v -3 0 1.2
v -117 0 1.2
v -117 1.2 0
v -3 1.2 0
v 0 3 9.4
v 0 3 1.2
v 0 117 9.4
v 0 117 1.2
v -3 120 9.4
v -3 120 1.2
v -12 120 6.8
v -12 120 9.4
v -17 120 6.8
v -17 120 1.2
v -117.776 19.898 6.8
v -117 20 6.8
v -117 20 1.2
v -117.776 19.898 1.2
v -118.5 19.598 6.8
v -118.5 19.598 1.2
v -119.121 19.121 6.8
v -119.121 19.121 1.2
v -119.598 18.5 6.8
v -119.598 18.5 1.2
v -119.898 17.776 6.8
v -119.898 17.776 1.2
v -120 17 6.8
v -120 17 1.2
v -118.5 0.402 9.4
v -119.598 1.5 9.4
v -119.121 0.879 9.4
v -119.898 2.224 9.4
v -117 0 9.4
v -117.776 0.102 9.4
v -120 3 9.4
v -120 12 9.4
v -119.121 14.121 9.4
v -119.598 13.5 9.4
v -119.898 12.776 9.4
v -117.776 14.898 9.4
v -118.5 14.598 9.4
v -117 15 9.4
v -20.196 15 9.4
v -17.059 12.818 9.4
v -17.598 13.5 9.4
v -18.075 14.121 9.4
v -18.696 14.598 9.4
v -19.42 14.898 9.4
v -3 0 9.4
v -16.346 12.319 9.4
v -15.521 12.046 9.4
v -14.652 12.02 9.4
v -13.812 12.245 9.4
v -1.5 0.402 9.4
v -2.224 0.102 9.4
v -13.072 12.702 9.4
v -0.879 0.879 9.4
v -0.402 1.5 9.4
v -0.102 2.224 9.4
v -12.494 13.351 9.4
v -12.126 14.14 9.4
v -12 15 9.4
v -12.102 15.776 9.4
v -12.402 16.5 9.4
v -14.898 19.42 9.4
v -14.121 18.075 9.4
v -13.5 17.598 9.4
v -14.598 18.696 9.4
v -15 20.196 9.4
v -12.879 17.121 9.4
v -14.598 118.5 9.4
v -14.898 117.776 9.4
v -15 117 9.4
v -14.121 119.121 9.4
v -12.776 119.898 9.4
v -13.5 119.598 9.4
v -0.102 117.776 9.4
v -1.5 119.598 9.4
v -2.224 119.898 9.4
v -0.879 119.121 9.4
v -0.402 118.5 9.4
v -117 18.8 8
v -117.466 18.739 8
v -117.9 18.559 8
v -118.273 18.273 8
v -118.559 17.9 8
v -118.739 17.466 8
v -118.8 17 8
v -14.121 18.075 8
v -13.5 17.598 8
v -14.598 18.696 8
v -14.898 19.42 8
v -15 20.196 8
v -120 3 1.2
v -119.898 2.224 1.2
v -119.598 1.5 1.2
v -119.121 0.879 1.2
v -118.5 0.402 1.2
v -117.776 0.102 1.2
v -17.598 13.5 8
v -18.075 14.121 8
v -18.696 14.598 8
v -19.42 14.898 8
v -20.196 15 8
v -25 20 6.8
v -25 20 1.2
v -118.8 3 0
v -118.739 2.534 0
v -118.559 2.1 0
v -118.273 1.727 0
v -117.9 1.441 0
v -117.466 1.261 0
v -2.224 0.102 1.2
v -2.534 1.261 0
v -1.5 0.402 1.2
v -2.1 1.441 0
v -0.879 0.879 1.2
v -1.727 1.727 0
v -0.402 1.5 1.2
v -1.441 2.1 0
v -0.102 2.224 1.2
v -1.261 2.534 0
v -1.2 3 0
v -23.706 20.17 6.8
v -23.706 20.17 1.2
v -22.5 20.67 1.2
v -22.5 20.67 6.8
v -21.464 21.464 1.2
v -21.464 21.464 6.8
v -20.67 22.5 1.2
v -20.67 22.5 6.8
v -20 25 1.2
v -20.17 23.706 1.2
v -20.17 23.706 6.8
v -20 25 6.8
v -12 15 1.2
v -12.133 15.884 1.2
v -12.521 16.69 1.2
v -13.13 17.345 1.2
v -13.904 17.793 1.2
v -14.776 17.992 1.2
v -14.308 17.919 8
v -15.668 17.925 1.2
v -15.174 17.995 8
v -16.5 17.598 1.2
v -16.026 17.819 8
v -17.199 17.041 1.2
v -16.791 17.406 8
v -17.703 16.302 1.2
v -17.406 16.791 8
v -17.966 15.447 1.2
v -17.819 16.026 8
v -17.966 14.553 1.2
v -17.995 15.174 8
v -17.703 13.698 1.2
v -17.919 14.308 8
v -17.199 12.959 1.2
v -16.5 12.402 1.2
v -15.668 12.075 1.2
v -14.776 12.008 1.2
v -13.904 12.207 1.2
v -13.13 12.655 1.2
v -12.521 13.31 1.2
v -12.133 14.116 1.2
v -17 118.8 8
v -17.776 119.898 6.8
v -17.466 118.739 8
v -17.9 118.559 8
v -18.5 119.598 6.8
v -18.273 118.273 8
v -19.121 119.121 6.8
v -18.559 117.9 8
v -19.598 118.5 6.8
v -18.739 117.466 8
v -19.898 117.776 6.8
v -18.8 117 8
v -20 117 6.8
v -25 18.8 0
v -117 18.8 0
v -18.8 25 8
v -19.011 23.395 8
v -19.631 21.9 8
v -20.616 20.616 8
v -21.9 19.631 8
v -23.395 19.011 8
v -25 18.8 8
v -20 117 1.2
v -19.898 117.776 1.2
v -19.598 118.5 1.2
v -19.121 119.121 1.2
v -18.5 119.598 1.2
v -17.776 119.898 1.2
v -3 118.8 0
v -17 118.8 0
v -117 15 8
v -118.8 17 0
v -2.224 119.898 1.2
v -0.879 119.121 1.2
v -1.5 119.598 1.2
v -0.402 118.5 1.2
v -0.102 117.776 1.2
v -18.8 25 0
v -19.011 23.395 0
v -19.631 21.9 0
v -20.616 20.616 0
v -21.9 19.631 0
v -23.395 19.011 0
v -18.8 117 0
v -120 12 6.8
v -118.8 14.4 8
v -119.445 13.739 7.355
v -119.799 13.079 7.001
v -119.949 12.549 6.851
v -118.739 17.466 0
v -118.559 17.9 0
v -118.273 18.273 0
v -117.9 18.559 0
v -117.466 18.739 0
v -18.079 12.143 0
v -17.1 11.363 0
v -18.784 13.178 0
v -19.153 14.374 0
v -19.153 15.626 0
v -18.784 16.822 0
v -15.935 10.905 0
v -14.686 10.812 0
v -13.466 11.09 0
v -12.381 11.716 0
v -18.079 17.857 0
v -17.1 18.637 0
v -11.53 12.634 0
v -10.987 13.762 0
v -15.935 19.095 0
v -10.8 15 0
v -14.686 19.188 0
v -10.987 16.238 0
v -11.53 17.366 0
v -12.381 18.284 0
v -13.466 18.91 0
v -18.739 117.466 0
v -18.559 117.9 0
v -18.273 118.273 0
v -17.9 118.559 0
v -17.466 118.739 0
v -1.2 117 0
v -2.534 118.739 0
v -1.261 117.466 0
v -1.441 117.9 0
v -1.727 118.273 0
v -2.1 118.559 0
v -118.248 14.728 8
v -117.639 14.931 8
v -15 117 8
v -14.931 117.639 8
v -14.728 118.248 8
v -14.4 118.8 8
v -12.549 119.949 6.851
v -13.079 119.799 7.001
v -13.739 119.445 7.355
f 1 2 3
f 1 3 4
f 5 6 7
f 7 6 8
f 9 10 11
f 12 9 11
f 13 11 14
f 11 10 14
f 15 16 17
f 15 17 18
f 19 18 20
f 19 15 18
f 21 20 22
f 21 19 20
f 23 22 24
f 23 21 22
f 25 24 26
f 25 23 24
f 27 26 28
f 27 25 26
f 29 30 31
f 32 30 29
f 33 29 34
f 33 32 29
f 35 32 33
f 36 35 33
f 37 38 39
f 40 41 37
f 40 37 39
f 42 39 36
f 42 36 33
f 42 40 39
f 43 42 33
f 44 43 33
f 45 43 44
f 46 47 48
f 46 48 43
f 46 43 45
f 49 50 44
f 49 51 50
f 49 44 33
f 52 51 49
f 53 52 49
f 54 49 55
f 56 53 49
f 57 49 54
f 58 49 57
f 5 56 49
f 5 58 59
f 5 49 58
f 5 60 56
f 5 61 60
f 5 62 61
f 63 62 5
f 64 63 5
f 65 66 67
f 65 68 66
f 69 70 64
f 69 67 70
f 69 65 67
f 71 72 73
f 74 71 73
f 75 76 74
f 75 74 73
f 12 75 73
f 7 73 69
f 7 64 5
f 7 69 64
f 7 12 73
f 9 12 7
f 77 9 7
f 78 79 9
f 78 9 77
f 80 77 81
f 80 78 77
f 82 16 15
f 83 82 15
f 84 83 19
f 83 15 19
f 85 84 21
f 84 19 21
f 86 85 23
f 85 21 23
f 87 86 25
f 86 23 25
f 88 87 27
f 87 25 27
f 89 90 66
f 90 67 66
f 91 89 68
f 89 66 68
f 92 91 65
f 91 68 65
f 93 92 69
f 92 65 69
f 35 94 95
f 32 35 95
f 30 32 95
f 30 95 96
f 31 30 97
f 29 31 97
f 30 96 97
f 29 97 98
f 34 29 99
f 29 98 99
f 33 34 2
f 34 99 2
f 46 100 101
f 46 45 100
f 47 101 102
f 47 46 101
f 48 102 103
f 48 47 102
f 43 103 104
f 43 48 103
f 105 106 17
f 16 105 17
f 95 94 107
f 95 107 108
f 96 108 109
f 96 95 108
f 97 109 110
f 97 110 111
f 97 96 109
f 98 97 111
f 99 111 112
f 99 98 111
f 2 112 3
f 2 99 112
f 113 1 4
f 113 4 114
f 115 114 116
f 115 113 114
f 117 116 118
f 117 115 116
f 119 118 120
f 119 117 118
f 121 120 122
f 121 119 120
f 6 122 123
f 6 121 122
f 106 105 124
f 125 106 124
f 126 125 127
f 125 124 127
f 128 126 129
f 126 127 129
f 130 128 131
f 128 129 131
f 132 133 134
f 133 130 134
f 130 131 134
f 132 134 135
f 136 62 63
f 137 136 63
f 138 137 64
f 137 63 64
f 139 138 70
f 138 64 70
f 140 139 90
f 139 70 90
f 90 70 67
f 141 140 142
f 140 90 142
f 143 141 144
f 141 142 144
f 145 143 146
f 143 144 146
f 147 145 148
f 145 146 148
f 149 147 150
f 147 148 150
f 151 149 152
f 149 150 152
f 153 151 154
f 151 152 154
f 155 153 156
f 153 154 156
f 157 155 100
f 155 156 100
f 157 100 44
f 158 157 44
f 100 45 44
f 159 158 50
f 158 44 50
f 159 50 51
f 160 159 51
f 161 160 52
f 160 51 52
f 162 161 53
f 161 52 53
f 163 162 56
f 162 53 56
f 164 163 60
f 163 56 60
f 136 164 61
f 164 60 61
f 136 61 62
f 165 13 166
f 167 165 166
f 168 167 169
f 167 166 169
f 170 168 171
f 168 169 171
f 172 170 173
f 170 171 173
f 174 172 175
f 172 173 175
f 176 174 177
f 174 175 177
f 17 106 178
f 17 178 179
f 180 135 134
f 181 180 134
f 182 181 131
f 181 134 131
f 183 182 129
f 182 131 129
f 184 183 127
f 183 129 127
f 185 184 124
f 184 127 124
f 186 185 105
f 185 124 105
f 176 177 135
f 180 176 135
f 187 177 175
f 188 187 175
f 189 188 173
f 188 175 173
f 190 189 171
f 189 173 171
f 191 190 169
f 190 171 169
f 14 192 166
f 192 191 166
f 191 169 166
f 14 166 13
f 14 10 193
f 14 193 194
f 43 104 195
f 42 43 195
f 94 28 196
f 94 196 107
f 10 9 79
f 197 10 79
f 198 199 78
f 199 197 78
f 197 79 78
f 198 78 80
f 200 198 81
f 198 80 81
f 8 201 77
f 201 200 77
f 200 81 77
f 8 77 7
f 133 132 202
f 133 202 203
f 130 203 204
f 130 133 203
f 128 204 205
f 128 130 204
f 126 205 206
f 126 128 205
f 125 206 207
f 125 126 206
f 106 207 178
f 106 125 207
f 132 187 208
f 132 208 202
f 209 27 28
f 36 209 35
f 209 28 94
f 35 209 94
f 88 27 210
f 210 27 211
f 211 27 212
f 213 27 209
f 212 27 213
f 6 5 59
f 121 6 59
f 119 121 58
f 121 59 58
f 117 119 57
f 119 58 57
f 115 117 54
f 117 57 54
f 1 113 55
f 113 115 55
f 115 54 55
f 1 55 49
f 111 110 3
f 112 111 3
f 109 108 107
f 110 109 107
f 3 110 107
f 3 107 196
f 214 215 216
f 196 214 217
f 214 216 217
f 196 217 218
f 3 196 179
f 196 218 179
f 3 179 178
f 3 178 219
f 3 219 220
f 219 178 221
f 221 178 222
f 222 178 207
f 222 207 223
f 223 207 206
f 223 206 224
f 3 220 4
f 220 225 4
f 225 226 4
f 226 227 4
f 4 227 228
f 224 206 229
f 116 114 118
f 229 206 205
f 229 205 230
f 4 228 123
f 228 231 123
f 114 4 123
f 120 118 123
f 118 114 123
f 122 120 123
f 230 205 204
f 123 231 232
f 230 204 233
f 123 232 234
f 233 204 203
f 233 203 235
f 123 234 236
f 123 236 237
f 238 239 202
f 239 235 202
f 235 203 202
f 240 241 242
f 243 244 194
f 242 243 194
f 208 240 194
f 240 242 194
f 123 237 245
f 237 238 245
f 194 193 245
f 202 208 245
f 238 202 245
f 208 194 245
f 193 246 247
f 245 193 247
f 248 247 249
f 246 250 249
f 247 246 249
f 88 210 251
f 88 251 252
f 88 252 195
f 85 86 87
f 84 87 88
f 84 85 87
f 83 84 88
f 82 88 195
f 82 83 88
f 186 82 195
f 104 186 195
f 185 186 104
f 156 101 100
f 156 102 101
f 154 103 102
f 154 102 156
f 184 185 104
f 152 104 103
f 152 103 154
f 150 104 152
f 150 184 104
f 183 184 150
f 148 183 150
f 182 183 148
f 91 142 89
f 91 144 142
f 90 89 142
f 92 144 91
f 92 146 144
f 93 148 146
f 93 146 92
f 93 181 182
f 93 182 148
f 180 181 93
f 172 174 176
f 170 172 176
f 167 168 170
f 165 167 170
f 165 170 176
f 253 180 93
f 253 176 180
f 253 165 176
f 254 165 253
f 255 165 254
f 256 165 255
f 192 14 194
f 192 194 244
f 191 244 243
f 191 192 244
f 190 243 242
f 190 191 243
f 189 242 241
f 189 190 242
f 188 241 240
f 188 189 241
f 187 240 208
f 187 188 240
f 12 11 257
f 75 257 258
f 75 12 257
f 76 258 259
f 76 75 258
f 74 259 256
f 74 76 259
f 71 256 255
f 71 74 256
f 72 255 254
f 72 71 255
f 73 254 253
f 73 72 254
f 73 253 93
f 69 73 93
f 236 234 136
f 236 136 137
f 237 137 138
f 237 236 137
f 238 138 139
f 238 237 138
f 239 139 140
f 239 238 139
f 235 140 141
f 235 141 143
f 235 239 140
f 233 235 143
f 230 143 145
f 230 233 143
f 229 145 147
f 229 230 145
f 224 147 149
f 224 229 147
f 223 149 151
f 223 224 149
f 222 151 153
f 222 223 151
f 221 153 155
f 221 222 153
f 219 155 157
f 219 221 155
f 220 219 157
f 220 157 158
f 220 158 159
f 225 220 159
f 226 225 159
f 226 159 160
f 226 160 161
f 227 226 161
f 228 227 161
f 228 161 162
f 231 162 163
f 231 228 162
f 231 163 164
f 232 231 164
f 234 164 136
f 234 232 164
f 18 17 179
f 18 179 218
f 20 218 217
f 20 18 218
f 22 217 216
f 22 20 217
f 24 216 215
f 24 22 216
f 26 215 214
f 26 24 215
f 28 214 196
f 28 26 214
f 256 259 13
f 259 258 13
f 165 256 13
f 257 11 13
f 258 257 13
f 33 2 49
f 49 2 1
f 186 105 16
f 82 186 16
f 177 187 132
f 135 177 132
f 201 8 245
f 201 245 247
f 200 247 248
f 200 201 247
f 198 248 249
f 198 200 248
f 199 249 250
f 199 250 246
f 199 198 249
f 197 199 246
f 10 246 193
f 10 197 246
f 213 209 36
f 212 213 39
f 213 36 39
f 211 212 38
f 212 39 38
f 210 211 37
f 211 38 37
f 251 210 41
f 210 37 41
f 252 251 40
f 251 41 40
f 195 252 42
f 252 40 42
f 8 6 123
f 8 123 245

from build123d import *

# Parameters (mm, degrees)
F1_DEPTH = 8
F3_DEPTH = 1.4
F4_R     = 3
F5_DEPTH = 9.401
F6_R     = 5
F7_R     = 3
F8_SIZE  = 1.2
F9_SIZE  = 1.2


with BuildPart() as f1:
    # F0 (on Top) → F1 (new body)
    with BuildSketch(Plane.XY):
        Polygon((0, 0), (0, 120), (-20, 120), (-20, 20), (-120, 20), (-120, 0), align=None)
    extrude(amount=F1_DEPTH)

    # F2 (on face) → F3 (join)
    with BuildSketch(Plane.XY.offset(8)):
        Polygon((-120, 0), (0, 0), (0, 120), (-15, 120), (-15, 15), (-120, 15), align=None)
    extrude(amount=F3_DEPTH)

    # F4 (on face) → F5 (cut, through all)
    with BuildSketch(Plane.XY.offset(9.4)):
        with Locations((-15, 15)):
            Circle(F4_R)
    extrude(amount=-F5_DEPTH, mode=Mode.SUBTRACT)

    # F6
    f6_edges = [f1.edges().sort_by_distance(p)[0] for p in [
        (-20, 20, 4),
    ]]
    fillet(f6_edges, radius=F6_R)

    # F7
    f7_edges = [f1.edges().sort_by_distance(p)[0] for p in [
        (0, 0, 4.7),
        (0, 120, 4.7),
        (-20, 120, 4),
        (-120, 20, 4),
        (-120, 0, 4.7),
        (-120, 15, 8.7),
        (-15, 18, 8.7),
        (-18, 15, 8.7),
        (-15, 120, 8.7),
    ]]
    fillet(f7_edges, radius=F7_R)

    # F8
    f8_edges = [f1.edges().sort_by_distance(p)[0] for p in [
        (-20, 71, 8),
    ]]
    chamfer(f8_edges, length=F8_SIZE)

    # F9
    f9_edges = [f1.edges().sort_by_distance(p)[0] for p in [
        (-60, 0, 0),
        (-18, 15, 0),
    ]]
    chamfer(f9_edges, length=F9_SIZE)


solid = f1.part
